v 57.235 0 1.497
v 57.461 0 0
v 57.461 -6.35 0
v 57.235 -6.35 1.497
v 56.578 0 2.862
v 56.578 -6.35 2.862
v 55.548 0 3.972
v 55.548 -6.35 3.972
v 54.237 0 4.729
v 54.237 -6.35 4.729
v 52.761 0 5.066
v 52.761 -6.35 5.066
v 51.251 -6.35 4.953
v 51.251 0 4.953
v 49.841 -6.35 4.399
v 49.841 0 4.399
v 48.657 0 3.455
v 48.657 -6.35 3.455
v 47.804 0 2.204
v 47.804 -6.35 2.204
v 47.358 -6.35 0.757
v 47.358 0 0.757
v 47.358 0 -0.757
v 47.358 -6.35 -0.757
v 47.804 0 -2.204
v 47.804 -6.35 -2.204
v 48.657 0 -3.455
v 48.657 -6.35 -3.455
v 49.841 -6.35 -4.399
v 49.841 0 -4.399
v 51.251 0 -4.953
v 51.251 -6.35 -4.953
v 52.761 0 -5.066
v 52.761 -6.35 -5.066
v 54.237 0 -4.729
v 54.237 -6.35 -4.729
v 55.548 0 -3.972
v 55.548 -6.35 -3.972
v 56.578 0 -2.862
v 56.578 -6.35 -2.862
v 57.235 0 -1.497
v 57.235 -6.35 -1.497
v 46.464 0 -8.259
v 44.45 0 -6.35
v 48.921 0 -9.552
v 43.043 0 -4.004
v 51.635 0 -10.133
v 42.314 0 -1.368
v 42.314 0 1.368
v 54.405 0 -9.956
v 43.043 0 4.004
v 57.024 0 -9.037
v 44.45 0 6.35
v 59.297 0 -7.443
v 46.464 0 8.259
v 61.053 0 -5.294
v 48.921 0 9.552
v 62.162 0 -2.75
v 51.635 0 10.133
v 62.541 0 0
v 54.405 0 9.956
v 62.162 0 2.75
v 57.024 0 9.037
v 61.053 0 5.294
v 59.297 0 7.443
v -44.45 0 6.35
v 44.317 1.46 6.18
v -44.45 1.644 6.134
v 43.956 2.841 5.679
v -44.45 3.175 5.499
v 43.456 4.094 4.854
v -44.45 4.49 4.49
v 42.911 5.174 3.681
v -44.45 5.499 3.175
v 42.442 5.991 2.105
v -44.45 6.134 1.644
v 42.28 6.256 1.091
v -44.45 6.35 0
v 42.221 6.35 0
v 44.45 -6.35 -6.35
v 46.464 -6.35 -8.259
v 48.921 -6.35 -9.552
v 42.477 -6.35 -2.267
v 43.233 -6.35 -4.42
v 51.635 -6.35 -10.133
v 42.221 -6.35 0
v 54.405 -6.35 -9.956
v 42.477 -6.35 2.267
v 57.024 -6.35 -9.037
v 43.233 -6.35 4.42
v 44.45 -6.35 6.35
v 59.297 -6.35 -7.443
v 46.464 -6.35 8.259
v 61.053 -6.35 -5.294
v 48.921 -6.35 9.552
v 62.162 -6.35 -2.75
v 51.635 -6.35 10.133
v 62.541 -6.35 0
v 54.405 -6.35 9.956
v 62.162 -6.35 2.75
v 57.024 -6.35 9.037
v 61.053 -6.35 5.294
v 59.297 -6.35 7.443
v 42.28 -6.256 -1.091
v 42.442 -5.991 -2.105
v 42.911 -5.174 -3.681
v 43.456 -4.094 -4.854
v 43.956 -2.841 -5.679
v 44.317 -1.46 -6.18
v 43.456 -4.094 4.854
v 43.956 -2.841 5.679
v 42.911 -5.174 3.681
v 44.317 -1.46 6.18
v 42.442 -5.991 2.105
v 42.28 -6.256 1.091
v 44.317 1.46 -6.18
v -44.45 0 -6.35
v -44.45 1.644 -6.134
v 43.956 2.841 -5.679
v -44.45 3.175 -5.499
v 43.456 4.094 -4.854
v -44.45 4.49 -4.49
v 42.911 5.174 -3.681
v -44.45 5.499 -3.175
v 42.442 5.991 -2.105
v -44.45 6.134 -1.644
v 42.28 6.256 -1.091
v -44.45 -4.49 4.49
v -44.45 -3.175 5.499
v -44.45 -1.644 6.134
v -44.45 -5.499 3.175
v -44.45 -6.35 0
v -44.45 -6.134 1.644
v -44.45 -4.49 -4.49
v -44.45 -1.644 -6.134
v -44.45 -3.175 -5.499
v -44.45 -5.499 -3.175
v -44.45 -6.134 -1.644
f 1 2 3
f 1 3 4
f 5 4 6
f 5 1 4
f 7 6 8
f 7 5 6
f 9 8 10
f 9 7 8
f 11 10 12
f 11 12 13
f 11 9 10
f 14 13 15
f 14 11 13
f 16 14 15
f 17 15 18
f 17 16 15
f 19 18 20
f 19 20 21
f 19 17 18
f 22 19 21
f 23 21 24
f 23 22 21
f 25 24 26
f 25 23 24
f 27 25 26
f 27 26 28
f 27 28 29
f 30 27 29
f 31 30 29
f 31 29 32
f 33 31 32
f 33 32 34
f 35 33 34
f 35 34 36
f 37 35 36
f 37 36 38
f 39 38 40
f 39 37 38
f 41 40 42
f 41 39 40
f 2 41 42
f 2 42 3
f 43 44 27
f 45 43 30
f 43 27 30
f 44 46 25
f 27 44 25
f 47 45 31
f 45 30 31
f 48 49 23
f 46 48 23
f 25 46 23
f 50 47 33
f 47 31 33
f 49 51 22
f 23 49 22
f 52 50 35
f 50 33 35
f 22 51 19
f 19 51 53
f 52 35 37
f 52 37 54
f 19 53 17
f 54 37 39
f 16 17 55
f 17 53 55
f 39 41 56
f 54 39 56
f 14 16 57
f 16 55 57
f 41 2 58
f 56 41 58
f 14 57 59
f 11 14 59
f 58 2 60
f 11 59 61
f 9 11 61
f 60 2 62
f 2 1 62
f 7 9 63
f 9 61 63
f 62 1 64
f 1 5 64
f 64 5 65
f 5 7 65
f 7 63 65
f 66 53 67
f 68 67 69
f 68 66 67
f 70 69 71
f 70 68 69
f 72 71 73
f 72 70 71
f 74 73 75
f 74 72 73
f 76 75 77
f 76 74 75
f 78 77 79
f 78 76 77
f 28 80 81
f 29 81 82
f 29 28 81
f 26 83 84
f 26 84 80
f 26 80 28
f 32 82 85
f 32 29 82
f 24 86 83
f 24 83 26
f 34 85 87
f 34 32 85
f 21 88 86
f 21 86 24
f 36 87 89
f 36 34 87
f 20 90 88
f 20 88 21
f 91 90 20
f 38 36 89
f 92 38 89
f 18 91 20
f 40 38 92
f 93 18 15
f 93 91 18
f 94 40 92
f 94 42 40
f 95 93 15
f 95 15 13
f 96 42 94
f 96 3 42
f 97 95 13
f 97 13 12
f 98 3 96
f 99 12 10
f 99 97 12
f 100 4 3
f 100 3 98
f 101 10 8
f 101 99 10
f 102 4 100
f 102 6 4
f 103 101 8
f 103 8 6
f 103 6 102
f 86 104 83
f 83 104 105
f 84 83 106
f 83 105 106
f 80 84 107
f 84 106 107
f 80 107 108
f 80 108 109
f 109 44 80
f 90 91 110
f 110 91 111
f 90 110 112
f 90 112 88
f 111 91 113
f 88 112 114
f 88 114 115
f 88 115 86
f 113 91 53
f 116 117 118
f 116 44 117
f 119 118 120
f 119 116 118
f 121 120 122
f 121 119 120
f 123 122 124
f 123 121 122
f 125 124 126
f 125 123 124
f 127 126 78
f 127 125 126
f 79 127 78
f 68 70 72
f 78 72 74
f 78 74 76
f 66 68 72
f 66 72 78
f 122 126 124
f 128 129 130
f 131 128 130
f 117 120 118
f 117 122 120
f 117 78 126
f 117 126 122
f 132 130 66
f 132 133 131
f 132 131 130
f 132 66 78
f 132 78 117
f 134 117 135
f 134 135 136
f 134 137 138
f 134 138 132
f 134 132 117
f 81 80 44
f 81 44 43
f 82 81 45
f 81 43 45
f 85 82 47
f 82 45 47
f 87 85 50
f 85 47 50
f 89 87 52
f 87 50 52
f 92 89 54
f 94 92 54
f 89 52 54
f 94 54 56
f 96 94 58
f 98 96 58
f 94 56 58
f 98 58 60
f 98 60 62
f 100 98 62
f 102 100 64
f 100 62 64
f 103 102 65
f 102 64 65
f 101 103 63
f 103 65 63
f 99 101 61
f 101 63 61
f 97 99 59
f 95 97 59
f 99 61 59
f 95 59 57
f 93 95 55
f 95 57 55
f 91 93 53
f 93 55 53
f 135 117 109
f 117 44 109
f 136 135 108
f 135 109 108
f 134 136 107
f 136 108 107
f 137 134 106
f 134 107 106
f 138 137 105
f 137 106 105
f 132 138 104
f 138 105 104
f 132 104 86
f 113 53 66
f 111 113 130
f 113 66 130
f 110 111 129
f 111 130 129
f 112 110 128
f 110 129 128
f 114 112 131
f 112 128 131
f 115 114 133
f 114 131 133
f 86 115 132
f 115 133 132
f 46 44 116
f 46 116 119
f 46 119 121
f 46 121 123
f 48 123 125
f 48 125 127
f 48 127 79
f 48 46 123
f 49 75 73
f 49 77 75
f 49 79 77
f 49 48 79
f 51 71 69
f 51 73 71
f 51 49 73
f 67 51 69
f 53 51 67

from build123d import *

# Parameters (mm, degrees)
F1_DEPTH = 6.35
F2_R     = 6.3499
F0_R     = 5.08
F3_DEPTH = 6.35


# Not quite as in the source:
# - a fillet or chamfer is up to 0.001 mm smaller than in the source, because OpenCascade refuses the exact size


with BuildPart() as f1:
    # F0 (on Front) → F1 (new body, symmetric)
    with BuildSketch(Plane.XZ):
        with BuildLine():
            Line((44.45, 6.35), (-44.45, 6.35))
            ThreePointArc((-44.45, 6.35), (-42.7945407024, 3.3649028089), (-42.221147458, 0))
            ThreePointArc((-42.221147458, 0), (-42.7945407024, -3.3649028089), (-44.45, -6.35))
            Line((-44.45, -6.35), (44.45, -6.35))
            ThreePointArc((44.45, -6.35), (42.221147458, 0), (44.45, 6.35))
        make_face()
        with BuildLine():
            ThreePointArc((-42.221147458, 0), (-42.7945407024, 3.3649028089), (-44.45, 6.35))
            Line((-44.45, 6.35), (-44.45, -6.35))
            ThreePointArc((-44.45, -6.35), (-42.7945407024, -3.3649028089), (-42.221147458, 0))
        make_face()
    extrude(amount=F1_DEPTH, both=True)

    # F2 (radius 6.35 in the source; OpenCascade refuses exactly that, so slightly less here)
    f2_edges = [f1.edges().sort_by_distance(p)[0] for p in [
        (0, -6.35, 6.35),
        (0, 6.35, 6.35),
        (0, -6.35, -6.35),
        (0, 6.35, -6.35),
    ]]
    fillet(f2_edges, radius=F2_R)

    # F0 (on Front) → F3 (join)
    with BuildSketch(Plane.XZ):
        with BuildLine():
            ThreePointArc((62.541147458, 0), (55.7460502669, 9.5866067556), (44.45, 6.35))
            Line((44.45, 6.35), (44.45, -6.35))
            ThreePointArc((44.45, -6.35), (55.7460502669, -9.5866067556), (62.541147458, 0))
        make_face()
        with Locations((52.381147458, 0)):
            Circle(F0_R, mode=Mode.SUBTRACT)
        with BuildLine():
            Line((44.45, -6.35), (44.45, 6.35))
            ThreePointArc((44.45, 6.35), (42.221147458, 0), (44.45, -6.35))
        make_face()
    extrude(amount=F3_DEPTH)


solid = f1.part
